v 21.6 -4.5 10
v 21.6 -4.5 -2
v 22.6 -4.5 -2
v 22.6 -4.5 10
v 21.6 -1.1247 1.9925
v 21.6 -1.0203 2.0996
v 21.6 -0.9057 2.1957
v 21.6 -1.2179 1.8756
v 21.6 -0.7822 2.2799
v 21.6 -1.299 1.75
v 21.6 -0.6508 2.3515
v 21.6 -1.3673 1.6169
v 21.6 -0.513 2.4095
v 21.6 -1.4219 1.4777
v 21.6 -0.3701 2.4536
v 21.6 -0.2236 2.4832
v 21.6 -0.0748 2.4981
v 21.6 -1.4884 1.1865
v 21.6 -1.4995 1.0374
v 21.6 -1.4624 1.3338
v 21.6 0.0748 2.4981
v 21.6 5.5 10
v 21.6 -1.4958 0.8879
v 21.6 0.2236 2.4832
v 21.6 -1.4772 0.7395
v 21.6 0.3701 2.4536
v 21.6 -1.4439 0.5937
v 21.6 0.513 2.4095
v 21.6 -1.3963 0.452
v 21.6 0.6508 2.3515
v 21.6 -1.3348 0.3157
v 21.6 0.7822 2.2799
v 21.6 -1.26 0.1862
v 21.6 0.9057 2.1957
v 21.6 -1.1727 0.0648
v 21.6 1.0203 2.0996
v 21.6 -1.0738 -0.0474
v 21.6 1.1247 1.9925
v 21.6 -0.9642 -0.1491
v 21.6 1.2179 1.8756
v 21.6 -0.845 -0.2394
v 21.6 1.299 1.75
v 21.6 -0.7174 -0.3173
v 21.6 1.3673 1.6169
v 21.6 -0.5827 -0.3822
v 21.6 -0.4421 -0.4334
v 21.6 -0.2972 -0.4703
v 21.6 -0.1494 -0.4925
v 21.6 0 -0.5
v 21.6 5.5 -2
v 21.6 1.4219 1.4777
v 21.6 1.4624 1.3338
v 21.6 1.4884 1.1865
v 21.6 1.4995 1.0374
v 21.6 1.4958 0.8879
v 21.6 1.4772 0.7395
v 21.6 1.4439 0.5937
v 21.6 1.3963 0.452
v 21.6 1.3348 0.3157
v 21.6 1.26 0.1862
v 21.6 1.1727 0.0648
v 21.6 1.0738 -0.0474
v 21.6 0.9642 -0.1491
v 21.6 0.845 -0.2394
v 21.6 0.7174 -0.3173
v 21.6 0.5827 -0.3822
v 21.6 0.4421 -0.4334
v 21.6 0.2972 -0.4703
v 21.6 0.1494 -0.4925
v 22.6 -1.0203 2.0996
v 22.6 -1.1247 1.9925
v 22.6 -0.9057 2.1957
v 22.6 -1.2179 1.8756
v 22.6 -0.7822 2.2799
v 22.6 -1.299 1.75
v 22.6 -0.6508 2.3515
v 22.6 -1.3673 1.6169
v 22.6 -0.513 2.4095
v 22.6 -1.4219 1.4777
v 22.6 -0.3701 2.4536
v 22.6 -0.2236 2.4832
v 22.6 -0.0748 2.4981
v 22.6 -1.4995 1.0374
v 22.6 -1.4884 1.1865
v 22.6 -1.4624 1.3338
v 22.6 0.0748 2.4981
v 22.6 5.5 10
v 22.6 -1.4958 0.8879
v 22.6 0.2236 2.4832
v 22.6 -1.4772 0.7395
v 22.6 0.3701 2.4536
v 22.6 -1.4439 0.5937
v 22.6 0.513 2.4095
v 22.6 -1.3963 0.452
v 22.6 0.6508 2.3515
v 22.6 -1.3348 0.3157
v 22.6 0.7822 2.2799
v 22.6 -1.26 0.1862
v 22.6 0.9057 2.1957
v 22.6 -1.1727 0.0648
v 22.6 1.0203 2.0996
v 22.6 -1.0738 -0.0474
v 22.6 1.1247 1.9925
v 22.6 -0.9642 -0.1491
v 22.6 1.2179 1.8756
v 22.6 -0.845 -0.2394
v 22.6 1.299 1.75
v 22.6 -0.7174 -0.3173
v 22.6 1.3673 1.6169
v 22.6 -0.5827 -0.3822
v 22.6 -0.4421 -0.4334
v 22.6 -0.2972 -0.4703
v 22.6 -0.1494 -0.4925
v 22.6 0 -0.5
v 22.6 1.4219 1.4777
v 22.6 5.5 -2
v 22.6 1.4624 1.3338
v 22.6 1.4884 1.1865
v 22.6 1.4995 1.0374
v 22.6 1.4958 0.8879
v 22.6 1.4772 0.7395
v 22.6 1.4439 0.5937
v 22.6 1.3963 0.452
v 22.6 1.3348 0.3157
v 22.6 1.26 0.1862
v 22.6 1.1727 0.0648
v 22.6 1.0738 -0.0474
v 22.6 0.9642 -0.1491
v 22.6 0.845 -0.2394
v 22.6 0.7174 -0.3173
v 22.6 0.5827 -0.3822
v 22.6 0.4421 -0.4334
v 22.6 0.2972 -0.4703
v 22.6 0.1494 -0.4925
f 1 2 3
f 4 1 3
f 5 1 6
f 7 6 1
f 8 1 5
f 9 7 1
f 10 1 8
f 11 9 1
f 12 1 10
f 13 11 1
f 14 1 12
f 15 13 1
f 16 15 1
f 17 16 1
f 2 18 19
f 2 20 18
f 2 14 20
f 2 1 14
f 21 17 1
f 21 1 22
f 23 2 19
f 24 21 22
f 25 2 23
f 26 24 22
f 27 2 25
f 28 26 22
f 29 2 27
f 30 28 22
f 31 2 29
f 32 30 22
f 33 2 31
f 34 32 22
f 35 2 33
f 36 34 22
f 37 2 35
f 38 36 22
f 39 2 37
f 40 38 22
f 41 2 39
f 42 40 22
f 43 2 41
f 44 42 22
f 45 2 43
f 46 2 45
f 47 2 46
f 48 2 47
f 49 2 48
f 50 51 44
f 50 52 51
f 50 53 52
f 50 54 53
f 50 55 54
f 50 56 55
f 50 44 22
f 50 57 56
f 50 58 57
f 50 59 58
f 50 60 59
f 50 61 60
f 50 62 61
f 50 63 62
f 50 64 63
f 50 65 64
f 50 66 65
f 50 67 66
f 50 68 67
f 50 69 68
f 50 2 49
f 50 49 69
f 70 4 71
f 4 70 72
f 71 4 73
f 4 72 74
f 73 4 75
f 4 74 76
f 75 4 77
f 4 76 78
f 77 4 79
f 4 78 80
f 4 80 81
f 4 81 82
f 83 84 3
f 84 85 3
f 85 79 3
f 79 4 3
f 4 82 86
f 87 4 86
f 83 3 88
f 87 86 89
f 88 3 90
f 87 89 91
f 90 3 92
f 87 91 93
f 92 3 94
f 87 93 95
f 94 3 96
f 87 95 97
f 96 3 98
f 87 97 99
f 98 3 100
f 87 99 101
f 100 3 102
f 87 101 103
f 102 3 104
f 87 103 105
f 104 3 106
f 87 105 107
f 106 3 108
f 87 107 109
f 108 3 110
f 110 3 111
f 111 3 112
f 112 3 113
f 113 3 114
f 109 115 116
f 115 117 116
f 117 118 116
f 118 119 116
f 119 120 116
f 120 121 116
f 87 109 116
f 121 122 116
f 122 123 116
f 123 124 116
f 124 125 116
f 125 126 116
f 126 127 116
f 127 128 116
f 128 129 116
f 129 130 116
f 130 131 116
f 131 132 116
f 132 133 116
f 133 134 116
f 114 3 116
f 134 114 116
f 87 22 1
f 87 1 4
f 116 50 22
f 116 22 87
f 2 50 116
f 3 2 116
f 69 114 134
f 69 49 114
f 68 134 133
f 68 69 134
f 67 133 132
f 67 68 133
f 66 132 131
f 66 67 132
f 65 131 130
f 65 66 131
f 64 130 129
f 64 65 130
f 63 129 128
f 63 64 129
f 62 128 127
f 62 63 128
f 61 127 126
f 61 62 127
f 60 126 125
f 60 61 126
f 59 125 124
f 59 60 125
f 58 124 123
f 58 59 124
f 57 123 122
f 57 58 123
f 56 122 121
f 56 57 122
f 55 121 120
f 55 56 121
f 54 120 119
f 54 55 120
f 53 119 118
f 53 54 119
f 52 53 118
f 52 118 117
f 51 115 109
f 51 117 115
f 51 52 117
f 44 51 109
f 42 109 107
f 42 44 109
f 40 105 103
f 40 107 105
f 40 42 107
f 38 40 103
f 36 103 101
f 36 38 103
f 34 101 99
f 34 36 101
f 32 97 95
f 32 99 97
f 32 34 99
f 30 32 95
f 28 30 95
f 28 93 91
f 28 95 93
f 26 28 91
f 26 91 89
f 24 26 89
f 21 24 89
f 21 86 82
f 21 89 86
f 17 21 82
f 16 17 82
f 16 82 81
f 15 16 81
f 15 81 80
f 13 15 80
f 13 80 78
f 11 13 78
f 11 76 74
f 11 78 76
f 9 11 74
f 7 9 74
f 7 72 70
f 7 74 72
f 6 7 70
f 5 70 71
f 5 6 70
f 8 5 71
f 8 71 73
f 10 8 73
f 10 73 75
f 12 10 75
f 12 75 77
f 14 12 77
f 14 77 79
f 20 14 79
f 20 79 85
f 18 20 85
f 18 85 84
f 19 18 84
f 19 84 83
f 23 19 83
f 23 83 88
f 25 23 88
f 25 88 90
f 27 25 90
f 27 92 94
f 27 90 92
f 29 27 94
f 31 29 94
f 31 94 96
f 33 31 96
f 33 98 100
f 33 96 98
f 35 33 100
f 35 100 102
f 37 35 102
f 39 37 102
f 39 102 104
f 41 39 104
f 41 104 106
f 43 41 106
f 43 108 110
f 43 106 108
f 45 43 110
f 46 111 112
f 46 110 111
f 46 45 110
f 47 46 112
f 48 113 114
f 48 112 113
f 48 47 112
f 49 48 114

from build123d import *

# Parameters (mm, degrees)
CYLINDER3125_R               = 1.5
CYLINDER3125_DEPTH           = 12
CYLINDER3127_R               = 1.5
CYLINDER3127_DEPTH           = 4
BOX1135_W                    = 6
BOX1135_H                    = 6
BOX1135_DEPTH                = 2
COMPOUND1374_PLACEMENT_ANGLE = 90
BOX1136_W                    = 1
BOX1136_H                    = 10
BOX1136_DEPTH                = 12


with BuildPart() as v_lec3095:
    # Cylinder3125 → Cylinder3125 (new body)
    with BuildSketch(Plane(origin=(1, 14, 6), x_dir=(1, 0, 0), z_dir=(0, 0, 1))):
        Circle(CYLINDER3125_R)
    extrude(amount=CYLINDER3125_DEPTH)


with BuildPart() as v_lec3097:
    # Cylinder3127 → Cylinder3127 (new body)
    with BuildSketch(Plane(origin=(1, 14, -0.1), x_dir=(1, 0, 0), z_dir=(0, 0, 1))):
        Circle(CYLINDER3127_R)
    extrude(amount=CYLINDER3127_DEPTH)


with BuildPart() as compound1374:
    # Box1135 → Box1135 (new body)
    with BuildSketch(Plane(origin=(-2, 11, 4), x_dir=(1, 0, 0), z_dir=(0, 0, 1))):
        with Locations((3, 3)):
            Rectangle(BOX1135_W, BOX1135_H)
    extrude(amount=BOX1135_DEPTH)

    # Compound1374: union Válec3095, Válec3097
    add(v_lec3095.part)
    add(v_lec3097.part)


with BuildPart() as compound1374_1:
    # Compound1374 placement: moved
    add(compound1374.part.moved(Location((6, -14, 2))).rotate(Axis((6, -14, 2), (0, 1, 0)), COMPOUND1374_PLACEMENT_ANGLE))


with BuildPart() as cut1267:
    # Box1136 → Box1136 (new body)
    with BuildSketch(Plane(origin=(21.4, -4.5, -2), x_dir=(1, 0, 0), z_dir=(0, 0, 1))):
        with Locations((0.5, 5)):
            Rectangle(BOX1136_W, BOX1136_H)
    extrude(amount=BOX1136_DEPTH)

    # Cut1267: cut Compound1374
    add(compound1374_1.part, mode=Mode.SUBTRACT)


with BuildPart() as cut1267_1:
    # Cut1267 placement: moved
    add(cut1267.part.moved(Location((0.2, 0, 0))))


solid = cut1267_1.part
